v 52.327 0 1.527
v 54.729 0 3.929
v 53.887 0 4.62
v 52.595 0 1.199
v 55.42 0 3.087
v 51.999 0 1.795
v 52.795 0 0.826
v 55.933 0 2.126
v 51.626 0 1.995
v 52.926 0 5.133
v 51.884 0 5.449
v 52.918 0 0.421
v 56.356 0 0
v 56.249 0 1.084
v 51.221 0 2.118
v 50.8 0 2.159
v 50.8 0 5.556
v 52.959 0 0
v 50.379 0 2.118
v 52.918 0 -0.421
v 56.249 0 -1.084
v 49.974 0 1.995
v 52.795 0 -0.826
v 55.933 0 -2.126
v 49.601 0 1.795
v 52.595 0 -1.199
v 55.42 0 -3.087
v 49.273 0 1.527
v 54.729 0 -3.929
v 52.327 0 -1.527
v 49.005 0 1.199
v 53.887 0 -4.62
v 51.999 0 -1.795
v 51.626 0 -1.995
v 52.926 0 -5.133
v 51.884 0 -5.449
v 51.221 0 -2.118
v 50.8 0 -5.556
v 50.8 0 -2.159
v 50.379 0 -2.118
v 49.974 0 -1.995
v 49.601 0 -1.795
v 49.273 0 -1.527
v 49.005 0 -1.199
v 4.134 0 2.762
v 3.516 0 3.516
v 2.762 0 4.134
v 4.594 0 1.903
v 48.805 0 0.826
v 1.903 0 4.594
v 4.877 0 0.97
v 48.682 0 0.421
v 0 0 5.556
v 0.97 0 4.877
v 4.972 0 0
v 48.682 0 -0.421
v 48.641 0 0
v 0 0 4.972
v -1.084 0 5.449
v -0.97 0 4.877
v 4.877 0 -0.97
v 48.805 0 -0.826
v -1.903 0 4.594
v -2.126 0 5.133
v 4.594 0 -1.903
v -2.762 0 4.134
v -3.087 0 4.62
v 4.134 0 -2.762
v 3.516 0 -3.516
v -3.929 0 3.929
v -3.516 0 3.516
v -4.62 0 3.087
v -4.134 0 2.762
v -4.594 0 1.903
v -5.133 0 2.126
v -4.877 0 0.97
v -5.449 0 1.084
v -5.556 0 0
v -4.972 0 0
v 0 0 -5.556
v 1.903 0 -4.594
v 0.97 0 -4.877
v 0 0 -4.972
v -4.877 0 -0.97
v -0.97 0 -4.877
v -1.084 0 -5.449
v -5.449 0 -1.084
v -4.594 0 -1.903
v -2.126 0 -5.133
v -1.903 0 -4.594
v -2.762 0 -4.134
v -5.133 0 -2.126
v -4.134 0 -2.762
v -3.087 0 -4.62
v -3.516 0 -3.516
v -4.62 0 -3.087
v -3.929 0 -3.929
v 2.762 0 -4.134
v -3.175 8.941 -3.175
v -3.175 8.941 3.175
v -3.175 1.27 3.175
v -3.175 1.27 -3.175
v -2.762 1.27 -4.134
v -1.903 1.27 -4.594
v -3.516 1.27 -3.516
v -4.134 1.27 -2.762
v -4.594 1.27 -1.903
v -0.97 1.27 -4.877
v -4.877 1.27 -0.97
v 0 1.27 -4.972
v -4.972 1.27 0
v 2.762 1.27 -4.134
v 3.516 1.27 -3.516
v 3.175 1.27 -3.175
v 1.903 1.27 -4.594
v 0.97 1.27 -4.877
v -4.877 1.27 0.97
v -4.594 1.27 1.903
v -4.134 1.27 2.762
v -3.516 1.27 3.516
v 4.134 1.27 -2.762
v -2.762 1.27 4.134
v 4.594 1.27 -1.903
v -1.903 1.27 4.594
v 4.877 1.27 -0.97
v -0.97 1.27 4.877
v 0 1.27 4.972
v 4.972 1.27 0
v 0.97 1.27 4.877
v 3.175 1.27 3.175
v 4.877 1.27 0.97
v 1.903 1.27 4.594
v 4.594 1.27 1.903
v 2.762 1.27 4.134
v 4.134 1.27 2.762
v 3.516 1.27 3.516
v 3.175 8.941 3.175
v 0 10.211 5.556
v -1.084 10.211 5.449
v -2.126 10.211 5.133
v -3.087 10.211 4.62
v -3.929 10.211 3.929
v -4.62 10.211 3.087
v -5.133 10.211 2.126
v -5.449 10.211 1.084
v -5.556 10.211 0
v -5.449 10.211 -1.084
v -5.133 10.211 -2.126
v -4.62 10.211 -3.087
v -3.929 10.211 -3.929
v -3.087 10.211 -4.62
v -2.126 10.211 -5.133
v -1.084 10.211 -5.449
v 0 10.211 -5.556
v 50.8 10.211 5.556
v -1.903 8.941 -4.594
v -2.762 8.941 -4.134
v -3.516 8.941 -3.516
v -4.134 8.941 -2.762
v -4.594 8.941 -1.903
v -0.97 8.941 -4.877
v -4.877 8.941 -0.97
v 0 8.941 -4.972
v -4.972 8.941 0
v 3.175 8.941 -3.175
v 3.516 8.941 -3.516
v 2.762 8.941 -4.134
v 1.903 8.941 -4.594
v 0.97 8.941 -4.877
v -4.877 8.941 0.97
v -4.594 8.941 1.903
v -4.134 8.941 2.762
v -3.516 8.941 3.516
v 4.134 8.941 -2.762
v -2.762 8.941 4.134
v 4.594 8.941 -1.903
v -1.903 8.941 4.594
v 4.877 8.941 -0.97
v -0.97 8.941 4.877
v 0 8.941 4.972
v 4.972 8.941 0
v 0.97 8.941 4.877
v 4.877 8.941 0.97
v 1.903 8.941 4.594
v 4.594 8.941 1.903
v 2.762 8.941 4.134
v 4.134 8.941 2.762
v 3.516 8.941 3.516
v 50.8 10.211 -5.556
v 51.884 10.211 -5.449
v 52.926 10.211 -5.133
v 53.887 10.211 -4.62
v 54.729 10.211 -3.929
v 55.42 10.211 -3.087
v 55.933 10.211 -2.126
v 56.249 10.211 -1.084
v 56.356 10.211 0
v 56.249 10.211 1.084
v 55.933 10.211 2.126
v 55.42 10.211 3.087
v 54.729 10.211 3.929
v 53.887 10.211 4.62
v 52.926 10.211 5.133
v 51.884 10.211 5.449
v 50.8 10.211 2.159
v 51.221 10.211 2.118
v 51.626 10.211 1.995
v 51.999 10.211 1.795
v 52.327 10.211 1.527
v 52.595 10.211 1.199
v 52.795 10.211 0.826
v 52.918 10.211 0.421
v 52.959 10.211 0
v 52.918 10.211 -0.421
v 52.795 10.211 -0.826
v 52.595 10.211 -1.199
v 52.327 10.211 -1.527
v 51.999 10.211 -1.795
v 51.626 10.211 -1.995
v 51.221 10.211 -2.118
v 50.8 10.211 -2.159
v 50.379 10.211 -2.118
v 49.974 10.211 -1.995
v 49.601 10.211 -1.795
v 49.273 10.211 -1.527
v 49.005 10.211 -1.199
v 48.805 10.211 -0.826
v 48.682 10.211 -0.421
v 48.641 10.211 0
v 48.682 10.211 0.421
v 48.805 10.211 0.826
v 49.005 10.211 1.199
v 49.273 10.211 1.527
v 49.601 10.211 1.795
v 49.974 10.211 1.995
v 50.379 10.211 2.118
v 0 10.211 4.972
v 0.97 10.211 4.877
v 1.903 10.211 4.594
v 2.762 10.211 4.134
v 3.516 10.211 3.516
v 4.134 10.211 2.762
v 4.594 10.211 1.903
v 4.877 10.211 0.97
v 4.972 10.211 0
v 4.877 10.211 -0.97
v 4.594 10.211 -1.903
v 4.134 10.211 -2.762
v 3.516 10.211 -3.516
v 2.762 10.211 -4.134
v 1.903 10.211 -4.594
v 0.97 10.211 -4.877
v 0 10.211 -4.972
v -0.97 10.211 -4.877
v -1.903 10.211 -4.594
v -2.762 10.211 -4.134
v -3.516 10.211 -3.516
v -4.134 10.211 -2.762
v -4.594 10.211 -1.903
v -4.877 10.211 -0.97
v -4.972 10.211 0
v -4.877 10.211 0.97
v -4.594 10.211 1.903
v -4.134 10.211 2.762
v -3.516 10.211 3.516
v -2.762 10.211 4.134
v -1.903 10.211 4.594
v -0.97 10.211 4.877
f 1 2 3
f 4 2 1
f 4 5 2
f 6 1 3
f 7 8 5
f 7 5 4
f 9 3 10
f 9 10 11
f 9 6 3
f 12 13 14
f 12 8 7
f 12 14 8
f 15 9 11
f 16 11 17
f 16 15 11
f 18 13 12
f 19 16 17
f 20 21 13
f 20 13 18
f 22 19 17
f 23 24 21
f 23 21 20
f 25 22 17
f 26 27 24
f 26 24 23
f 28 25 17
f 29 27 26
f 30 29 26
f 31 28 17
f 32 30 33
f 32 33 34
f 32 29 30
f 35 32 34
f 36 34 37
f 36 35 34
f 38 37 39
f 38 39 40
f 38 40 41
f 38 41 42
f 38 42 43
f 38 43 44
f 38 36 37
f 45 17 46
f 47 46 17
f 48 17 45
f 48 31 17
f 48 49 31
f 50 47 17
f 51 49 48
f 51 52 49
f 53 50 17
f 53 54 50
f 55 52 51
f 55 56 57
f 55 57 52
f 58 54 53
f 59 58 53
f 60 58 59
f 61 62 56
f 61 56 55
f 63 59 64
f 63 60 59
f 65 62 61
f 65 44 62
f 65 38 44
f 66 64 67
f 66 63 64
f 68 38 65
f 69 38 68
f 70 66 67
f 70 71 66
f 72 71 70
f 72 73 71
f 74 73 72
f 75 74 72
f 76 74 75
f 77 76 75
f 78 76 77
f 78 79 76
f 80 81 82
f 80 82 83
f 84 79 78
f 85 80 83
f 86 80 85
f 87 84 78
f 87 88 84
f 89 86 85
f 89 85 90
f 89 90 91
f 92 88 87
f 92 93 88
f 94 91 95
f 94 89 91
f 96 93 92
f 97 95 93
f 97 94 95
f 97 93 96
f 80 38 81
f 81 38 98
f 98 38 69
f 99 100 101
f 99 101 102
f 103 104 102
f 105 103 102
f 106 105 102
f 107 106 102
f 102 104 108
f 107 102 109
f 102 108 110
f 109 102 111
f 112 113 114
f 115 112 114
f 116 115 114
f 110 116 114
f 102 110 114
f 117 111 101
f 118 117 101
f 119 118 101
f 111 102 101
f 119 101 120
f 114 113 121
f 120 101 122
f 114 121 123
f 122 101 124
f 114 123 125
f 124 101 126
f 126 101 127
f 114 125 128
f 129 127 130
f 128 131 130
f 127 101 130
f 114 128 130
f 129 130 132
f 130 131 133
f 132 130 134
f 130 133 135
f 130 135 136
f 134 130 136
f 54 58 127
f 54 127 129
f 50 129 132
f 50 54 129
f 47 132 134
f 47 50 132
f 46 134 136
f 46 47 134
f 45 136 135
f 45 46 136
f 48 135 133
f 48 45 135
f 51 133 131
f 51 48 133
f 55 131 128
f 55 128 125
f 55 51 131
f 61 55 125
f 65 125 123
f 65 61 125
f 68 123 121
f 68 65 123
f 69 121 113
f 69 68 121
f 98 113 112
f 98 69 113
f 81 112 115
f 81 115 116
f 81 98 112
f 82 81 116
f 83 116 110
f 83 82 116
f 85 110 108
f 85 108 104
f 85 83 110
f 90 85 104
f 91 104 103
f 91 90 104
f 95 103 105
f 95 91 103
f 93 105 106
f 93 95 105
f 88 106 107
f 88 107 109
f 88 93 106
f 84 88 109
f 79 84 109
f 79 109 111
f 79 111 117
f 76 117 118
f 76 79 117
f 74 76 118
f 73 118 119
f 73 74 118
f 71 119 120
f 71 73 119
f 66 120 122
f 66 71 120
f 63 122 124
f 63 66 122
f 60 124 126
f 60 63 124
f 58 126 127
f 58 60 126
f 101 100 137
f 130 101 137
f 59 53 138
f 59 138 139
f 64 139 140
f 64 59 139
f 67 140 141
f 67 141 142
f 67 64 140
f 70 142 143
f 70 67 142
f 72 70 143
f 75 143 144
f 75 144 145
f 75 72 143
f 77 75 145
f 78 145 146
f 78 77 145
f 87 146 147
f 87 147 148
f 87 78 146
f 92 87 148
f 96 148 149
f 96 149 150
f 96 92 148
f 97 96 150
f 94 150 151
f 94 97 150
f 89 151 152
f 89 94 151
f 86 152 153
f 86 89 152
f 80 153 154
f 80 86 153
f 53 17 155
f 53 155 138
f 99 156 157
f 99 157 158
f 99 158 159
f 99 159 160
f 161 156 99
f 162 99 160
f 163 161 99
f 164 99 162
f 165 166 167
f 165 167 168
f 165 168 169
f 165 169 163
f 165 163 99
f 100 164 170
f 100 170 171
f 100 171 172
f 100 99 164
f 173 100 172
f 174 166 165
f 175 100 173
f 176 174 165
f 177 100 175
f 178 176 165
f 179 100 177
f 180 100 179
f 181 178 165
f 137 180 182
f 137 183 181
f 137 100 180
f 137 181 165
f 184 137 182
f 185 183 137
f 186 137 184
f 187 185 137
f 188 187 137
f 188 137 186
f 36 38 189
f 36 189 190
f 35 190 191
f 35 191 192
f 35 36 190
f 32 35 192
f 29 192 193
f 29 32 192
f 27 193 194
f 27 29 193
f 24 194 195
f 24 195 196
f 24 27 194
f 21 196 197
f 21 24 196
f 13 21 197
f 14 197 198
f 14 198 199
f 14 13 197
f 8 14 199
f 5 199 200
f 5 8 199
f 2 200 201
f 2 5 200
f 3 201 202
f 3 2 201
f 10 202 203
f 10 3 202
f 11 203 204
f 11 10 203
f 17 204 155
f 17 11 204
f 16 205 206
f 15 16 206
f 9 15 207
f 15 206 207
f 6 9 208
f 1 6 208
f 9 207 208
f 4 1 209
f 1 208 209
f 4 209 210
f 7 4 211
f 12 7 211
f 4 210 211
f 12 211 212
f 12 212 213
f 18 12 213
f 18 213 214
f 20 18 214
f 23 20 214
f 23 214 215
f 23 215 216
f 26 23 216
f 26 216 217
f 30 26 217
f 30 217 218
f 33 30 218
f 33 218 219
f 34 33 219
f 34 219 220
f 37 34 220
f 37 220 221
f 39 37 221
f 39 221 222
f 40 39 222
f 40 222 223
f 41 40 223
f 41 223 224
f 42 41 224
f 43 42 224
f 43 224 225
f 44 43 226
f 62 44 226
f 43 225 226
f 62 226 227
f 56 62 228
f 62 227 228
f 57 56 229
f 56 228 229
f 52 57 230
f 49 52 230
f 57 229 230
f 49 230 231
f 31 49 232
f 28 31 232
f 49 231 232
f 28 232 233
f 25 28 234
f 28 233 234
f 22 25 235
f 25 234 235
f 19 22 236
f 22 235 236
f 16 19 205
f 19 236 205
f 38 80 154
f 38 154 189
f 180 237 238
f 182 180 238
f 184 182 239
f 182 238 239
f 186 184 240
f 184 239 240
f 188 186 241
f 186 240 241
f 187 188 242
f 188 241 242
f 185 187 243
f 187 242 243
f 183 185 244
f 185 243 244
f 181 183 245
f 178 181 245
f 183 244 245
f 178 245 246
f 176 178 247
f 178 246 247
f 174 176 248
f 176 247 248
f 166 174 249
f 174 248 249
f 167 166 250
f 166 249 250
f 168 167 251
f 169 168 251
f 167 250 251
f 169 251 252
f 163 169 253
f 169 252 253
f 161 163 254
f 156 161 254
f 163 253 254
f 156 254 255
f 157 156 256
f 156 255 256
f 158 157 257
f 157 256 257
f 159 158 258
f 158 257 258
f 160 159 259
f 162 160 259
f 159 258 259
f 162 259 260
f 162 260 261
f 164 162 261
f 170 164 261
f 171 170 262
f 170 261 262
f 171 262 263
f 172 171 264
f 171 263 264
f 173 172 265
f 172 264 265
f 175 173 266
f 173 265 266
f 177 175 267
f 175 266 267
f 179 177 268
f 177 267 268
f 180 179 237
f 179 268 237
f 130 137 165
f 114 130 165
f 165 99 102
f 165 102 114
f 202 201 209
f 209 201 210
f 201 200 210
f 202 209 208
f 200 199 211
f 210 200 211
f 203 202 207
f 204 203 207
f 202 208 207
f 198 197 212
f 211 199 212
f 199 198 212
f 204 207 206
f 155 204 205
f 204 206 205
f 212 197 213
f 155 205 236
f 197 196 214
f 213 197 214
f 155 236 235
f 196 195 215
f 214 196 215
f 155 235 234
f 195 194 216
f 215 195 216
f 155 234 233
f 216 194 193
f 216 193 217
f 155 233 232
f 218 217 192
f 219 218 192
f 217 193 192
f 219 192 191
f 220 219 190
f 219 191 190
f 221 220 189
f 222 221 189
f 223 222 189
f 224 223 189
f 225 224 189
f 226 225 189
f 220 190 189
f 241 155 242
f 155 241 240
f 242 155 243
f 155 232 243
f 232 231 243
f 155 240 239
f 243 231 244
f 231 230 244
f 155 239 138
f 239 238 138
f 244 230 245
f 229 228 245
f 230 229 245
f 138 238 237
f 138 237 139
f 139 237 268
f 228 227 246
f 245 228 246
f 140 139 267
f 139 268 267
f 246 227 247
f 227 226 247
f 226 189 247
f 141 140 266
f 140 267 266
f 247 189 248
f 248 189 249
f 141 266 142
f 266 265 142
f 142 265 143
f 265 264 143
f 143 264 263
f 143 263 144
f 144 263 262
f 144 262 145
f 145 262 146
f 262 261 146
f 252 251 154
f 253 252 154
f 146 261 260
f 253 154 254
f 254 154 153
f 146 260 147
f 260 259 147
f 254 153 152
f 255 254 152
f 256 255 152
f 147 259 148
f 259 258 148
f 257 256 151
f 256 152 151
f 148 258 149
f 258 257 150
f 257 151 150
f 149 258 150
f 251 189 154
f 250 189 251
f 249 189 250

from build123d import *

# Parameters (mm, degrees)
BOSS_EXTRUDE1_DEPTH = 10.2108
SKETCH2_R           = 2.159
SKETCH2_W           = 6.35
SKETCH2_H           = 6.35
CUT_EXTRUDE1_DEPTH  = 58.542673424
SKETCH3_R           = 4.97205
CUT_EXTRUDE2_DEPTH  = 1.27


with BuildPart() as part:
    # Sketch1 → Boss-Extrude1 (new body)
    with BuildSketch(Plane(origin=(0, 0, 0), x_dir=(1, 0, 0), z_dir=(0, 1, 0))):
        with BuildLine():
            Line((0, 5.55625), (50.8, 5.55625))
            ThreePointArc((50.8, 5.55625), (56.35625, 0), (50.8, -5.55625))
            Line((50.8, -5.55625), (0, -5.55625))
            ThreePointArc((0, -5.55625), (-5.55625, 0), (0, 5.55625))
        make_face()
    extrude(amount=BOSS_EXTRUDE1_DEPTH)

    # Sketch2 → Cut-Extrude1 (cut, through all)
    with BuildSketch(Plane(origin=(0, 10.2108, 0), x_dir=(1, 0, 0), z_dir=(0, 1, 0))):
        with Locations(Location((50.8, 0, 0), (0, 0, 270))):
            Circle(SKETCH2_R)
        Rectangle(SKETCH2_W, SKETCH2_H)
    extrude(amount=-CUT_EXTRUDE1_DEPTH, mode=Mode.SUBTRACT)

    # Sketch3 → Cut-Extrude2 (cut)
    with BuildSketch(Plane(origin=(0, 10.2108, 0), x_dir=(1, 0, 0), z_dir=(0, 1, 0))):
        with Locations(Location((0, 0, 0), (0, 0, 270))):
            Circle(SKETCH3_R)
    cut_extrude2 = extrude(amount=-CUT_EXTRUDE2_DEPTH, mode=Mode.SUBTRACT)

    # Mirror1: Cut-Extrude2 across plane
    add(cut_extrude2.mirror(Plane.ZX.offset(5.1054)), mode=Mode.SUBTRACT)


solid = part.part
